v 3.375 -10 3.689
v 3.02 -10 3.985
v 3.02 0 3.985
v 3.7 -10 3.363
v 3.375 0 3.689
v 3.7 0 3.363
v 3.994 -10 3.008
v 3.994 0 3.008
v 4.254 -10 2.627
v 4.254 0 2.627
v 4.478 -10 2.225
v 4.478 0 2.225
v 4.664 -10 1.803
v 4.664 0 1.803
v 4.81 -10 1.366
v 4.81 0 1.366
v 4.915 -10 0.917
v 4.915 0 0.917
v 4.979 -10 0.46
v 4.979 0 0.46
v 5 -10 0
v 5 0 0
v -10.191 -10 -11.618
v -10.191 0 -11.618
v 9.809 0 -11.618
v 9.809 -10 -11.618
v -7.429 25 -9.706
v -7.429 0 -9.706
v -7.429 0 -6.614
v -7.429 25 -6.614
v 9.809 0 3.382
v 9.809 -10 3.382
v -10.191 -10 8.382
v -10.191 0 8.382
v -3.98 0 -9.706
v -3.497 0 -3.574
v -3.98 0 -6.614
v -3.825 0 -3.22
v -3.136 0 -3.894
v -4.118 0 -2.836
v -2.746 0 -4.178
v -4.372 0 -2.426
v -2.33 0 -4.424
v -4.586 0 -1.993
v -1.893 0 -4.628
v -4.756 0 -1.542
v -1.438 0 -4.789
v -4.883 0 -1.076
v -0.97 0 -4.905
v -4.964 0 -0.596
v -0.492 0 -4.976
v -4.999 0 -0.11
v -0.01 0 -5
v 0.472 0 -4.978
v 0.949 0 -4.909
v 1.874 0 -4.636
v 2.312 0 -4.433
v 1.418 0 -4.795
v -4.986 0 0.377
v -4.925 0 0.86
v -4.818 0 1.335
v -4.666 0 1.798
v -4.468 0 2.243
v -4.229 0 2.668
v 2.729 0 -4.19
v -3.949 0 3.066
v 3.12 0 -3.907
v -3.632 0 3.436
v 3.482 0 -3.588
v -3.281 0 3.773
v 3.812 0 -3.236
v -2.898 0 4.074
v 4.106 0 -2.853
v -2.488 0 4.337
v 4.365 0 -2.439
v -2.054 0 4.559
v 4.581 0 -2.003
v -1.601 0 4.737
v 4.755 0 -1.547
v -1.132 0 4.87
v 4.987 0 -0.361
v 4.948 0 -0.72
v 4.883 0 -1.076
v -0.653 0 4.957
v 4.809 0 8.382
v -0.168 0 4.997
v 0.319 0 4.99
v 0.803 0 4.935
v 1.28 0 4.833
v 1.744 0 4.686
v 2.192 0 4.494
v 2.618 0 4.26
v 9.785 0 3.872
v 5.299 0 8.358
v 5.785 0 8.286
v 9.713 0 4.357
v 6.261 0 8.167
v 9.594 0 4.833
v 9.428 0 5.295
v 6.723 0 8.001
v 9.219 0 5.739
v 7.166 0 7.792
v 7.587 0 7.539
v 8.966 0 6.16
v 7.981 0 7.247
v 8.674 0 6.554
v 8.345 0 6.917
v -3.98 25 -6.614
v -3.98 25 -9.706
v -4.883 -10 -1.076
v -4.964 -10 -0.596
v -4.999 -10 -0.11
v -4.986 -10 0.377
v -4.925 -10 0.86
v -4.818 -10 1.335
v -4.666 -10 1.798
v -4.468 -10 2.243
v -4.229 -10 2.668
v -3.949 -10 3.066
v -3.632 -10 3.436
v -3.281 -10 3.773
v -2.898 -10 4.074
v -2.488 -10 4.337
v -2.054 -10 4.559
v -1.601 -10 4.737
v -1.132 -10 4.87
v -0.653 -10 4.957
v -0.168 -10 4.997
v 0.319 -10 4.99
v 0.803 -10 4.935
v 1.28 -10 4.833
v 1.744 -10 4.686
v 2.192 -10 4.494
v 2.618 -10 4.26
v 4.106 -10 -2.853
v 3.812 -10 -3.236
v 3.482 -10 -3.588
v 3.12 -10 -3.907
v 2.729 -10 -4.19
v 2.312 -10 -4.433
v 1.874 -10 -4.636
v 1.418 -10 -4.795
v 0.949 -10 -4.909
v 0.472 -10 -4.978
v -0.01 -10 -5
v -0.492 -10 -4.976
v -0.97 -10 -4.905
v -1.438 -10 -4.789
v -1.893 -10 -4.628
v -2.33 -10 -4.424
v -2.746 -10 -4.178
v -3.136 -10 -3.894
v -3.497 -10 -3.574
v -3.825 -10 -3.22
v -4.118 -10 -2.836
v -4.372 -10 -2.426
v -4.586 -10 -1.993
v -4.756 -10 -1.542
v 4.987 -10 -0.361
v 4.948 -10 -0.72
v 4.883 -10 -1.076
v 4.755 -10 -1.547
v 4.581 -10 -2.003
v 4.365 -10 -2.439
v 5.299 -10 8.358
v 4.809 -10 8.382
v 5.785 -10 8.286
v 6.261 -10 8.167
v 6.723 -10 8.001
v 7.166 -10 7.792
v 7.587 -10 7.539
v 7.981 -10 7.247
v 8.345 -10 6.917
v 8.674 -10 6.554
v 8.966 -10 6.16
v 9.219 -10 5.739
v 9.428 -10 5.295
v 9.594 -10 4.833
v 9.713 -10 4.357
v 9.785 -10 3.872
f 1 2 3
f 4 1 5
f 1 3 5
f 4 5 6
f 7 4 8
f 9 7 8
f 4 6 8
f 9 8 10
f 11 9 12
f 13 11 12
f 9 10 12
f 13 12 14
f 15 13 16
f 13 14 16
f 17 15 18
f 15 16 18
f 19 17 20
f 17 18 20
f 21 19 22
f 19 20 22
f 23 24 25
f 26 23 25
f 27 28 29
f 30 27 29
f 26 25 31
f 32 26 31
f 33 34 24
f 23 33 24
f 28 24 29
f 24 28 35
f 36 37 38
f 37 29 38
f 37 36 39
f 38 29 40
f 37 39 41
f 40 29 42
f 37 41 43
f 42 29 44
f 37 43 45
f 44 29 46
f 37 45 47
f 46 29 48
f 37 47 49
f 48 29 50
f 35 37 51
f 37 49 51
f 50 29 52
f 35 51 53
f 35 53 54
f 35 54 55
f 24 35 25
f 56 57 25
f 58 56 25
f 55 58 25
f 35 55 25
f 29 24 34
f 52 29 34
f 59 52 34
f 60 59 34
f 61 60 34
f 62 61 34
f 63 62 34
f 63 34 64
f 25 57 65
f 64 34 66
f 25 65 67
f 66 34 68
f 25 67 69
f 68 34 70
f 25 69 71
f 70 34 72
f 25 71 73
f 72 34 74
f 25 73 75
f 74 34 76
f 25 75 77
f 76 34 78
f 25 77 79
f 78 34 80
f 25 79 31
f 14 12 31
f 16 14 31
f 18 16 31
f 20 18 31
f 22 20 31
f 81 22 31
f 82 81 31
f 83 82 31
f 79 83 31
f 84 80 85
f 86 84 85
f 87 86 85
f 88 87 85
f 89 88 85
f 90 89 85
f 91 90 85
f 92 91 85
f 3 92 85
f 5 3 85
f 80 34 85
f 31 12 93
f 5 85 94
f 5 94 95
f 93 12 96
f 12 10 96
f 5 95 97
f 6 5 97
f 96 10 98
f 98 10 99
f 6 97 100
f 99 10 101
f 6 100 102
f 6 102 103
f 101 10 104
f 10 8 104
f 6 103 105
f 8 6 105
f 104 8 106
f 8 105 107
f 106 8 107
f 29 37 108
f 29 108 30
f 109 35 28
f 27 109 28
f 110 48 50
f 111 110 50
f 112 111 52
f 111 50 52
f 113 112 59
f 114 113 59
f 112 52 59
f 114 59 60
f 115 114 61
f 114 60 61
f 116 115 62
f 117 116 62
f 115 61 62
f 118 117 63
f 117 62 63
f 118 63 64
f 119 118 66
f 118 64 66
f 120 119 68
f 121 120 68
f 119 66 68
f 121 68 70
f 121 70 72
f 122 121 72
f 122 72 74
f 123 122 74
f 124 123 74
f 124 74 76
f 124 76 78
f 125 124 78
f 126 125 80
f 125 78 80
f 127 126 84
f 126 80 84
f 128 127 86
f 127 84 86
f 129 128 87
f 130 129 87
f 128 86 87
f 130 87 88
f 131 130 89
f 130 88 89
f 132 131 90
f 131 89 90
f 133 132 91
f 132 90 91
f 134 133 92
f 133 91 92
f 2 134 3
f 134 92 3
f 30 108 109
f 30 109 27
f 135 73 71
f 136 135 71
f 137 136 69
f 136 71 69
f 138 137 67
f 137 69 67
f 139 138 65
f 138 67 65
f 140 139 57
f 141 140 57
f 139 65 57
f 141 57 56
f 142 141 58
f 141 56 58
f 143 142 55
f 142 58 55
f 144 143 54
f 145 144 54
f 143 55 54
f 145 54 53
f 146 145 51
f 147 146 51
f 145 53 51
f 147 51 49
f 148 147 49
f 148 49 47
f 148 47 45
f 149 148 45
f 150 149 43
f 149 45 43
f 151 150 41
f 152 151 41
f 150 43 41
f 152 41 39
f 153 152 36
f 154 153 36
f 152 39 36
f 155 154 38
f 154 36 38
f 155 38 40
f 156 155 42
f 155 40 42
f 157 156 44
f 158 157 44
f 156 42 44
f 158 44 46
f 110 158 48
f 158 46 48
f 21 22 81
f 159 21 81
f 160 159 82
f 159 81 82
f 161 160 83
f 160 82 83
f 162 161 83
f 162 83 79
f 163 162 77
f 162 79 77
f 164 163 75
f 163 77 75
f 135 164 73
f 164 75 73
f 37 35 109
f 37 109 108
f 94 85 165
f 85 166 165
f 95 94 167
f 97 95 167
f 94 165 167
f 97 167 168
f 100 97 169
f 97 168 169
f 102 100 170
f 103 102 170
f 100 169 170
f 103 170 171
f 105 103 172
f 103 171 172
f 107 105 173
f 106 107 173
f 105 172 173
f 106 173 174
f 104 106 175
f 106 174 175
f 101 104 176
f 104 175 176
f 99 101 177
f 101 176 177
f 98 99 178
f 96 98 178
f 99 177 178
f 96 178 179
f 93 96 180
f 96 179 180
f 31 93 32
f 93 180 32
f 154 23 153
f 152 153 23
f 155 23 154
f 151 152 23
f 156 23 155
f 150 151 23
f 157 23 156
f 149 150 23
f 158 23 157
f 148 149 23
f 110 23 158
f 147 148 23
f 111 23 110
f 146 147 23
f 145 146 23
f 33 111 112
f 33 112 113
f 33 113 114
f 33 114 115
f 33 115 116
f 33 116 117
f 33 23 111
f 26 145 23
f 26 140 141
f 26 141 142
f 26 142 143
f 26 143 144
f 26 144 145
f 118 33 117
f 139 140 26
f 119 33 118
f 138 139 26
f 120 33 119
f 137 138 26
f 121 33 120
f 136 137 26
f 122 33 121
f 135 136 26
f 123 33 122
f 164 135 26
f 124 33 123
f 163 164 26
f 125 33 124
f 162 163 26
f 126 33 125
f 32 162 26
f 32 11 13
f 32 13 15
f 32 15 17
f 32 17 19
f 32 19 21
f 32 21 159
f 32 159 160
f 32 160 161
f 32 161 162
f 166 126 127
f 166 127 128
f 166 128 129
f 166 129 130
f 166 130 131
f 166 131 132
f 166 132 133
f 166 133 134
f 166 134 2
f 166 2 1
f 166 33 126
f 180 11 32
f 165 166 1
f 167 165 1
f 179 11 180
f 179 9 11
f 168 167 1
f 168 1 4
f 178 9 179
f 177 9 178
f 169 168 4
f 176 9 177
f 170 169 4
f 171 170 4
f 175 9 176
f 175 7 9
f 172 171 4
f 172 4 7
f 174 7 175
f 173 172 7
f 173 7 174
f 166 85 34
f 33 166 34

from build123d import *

# Parameters (mm, degrees)
F1_DEPTH = 10
F2_R     = 5
F3_W     = 3.4494120628
F3_H     = 3.0921520665
F4_DEPTH = 25


with BuildPart() as f1:
    # F0 (on Front) → F1 (new body)
    with BuildSketch(Plane.XZ):
        with BuildLine():
            Line((9.80909843, 8.3819362969), (0.1013143445, 8.3819362969))
            ThreePointArc((0.1013143445, 8.3819362969), (1.7648005084, 6.3186167265), (3.0204653947, 3.9845688349))
            ThreePointArc((3.0204653947, 3.9845688349), (4.477852553, 2.2245980566), (5, 0))
            ThreePointArc((5, 0), (4.9706311589, -0.5411338858), (4.882869647, -1.0759107816))
            ThreePointArc((4.882869647, -1.0759107816), (6.6796718733, -2.1122029912), (8.2635629596, -3.4514896709))
            ThreePointArc((8.2635629596, -3.4514896709), (9.0582816008, -2.8412785407), (9.80909843, -2.1777957366))
            Line((9.80909843, -2.1777957366), (9.80909843, 8.3819362969))
        make_face()
        with BuildLine():
            Line((0.1013143445, 8.3819362969), (-10.19090157, 8.3819362969))
            Line((-10.19090157, 8.3819362969), (-10.19090157, -2.1777957366))
            ThreePointArc((-10.19090157, -2.1777957366), (-9.332541843, -2.9290474683), (-8.4179443125, -3.6107159674))
            ThreePointArc((-8.4179443125, -3.6107159674), (-6.7700976602, -2.1763910822), (-4.882869647, -1.0759107816))
            ThreePointArc((-4.882869647, -1.0759107816), (-2.6961548337, 4.2107896068), (3.0204653947, 3.9845688349))
            ThreePointArc((3.0204653947, 3.9845688349), (1.7648005084, 6.3186167265), (0.1013143445, 8.3819362969))
        make_face()
        with BuildLine():
            ThreePointArc((-8.4179443125, -3.6107159674), (-9.3833116946, -4.7673071134), (-10.19090157, -6.0390916293))
            Line((-10.19090157, -6.0390916293), (-10.19090157, -11.6180637031))
            Line((-10.19090157, -11.6180637031), (0.1013143445, -11.6180637031))
            ThreePointArc((0.1013143445, -11.6180637031), (2.2019143942, -8.8532431003), (3.5769410003, -5.6648178828))
            ThreePointArc((3.5769410003, -5.6648178828), (-2.6456826628, -5.9527067194), (-8.4179443125, -3.6107159674))
        make_face()
        with BuildLine():
            ThreePointArc((-4.882869647, -1.0759107816), (-6.7700976602, -2.1763910822), (-8.4179443125, -3.6107159674))
            ThreePointArc((-8.4179443125, -3.6107159674), (-2.6456826628, -5.9527067194), (3.5769410003, -5.6648178828))
            ThreePointArc((3.5769410003, -5.6648178828), (3.9117762713, -4.2721522728), (4.1061096807, -2.8530445651))
            ThreePointArc((4.1061096807, -2.8530445651), (-0.969737146, -4.9050596192), (-4.882869647, -1.0759107816))
        make_face()
        with BuildLine():
            ThreePointArc((-8.4179443125, -3.6107159674), (-9.332541843, -2.9290474683), (-10.19090157, -2.1777957366))
            Line((-10.19090157, -2.1777957366), (-10.19090157, -6.0390916293))
            ThreePointArc((-10.19090157, -6.0390916293), (-9.3833116946, -4.7673071134), (-8.4179443125, -3.6107159674))
        make_face()
        with BuildLine():
            ThreePointArc((4.1061096807, -2.8530445651), (3.9117762713, -4.2721522728), (3.5769410003, -5.6648178828))
            ThreePointArc((3.5769410003, -5.6648178828), (6.0196461638, -4.7686164468), (8.2635629596, -3.4514896709))
            ThreePointArc((8.2635629596, -3.4514896709), (6.6796718733, -2.1122029912), (4.882869647, -1.0759107816))
            ThreePointArc((4.882869647, -1.0759107816), (4.5814832161, -2.002501321), (4.1061096807, -2.8530445651))
        make_face()
        with BuildLine():
            ThreePointArc((8.2635629596, -3.4514896709), (6.0196461638, -4.7686164468), (3.5769410003, -5.6648178828))
            ThreePointArc((3.5769410003, -5.6648178828), (2.2019143942, -8.8532431003), (0.1013143445, -11.6180637031))
            Line((0.1013143445, -11.6180637031), (9.80909843, -11.6180637031))
            Line((9.80909843, -11.6180637031), (9.80909843, -5.3922310519))
            ThreePointArc((9.80909843, -5.3922310519), (9.0882832098, -4.3804872781), (8.2635629596, -3.4514896709))
        make_face()
        with BuildLine():
            Line((9.80909843, -5.3922310519), (9.80909843, -2.1777957366))
            ThreePointArc((9.80909843, -2.1777957366), (9.0582816008, -2.8412785407), (8.2635629596, -3.4514896709))
            ThreePointArc((8.2635629596, -3.4514896709), (9.0882832098, -4.3804872781), (9.80909843, -5.3922310519))
        make_face()
    extrude(amount=F1_DEPTH)

    # F2
    f2_edges = [f1.edges().sort_by_distance(p)[0] for p in [
        (9.809098, -5, 8.381936),
    ]]
    fillet(f2_edges, radius=F2_R)

    # F3 (on face) → F4 (join)
    with BuildSketch(Plane(origin=(0, 0, 0), x_dir=(-1, 0, 0), z_dir=(0, 1, 0))):
        with Locations((5.7046995498, -8.1599843688)):
            Rectangle(F3_W, F3_H)
    extrude(amount=F4_DEPTH)


solid = f1.part
